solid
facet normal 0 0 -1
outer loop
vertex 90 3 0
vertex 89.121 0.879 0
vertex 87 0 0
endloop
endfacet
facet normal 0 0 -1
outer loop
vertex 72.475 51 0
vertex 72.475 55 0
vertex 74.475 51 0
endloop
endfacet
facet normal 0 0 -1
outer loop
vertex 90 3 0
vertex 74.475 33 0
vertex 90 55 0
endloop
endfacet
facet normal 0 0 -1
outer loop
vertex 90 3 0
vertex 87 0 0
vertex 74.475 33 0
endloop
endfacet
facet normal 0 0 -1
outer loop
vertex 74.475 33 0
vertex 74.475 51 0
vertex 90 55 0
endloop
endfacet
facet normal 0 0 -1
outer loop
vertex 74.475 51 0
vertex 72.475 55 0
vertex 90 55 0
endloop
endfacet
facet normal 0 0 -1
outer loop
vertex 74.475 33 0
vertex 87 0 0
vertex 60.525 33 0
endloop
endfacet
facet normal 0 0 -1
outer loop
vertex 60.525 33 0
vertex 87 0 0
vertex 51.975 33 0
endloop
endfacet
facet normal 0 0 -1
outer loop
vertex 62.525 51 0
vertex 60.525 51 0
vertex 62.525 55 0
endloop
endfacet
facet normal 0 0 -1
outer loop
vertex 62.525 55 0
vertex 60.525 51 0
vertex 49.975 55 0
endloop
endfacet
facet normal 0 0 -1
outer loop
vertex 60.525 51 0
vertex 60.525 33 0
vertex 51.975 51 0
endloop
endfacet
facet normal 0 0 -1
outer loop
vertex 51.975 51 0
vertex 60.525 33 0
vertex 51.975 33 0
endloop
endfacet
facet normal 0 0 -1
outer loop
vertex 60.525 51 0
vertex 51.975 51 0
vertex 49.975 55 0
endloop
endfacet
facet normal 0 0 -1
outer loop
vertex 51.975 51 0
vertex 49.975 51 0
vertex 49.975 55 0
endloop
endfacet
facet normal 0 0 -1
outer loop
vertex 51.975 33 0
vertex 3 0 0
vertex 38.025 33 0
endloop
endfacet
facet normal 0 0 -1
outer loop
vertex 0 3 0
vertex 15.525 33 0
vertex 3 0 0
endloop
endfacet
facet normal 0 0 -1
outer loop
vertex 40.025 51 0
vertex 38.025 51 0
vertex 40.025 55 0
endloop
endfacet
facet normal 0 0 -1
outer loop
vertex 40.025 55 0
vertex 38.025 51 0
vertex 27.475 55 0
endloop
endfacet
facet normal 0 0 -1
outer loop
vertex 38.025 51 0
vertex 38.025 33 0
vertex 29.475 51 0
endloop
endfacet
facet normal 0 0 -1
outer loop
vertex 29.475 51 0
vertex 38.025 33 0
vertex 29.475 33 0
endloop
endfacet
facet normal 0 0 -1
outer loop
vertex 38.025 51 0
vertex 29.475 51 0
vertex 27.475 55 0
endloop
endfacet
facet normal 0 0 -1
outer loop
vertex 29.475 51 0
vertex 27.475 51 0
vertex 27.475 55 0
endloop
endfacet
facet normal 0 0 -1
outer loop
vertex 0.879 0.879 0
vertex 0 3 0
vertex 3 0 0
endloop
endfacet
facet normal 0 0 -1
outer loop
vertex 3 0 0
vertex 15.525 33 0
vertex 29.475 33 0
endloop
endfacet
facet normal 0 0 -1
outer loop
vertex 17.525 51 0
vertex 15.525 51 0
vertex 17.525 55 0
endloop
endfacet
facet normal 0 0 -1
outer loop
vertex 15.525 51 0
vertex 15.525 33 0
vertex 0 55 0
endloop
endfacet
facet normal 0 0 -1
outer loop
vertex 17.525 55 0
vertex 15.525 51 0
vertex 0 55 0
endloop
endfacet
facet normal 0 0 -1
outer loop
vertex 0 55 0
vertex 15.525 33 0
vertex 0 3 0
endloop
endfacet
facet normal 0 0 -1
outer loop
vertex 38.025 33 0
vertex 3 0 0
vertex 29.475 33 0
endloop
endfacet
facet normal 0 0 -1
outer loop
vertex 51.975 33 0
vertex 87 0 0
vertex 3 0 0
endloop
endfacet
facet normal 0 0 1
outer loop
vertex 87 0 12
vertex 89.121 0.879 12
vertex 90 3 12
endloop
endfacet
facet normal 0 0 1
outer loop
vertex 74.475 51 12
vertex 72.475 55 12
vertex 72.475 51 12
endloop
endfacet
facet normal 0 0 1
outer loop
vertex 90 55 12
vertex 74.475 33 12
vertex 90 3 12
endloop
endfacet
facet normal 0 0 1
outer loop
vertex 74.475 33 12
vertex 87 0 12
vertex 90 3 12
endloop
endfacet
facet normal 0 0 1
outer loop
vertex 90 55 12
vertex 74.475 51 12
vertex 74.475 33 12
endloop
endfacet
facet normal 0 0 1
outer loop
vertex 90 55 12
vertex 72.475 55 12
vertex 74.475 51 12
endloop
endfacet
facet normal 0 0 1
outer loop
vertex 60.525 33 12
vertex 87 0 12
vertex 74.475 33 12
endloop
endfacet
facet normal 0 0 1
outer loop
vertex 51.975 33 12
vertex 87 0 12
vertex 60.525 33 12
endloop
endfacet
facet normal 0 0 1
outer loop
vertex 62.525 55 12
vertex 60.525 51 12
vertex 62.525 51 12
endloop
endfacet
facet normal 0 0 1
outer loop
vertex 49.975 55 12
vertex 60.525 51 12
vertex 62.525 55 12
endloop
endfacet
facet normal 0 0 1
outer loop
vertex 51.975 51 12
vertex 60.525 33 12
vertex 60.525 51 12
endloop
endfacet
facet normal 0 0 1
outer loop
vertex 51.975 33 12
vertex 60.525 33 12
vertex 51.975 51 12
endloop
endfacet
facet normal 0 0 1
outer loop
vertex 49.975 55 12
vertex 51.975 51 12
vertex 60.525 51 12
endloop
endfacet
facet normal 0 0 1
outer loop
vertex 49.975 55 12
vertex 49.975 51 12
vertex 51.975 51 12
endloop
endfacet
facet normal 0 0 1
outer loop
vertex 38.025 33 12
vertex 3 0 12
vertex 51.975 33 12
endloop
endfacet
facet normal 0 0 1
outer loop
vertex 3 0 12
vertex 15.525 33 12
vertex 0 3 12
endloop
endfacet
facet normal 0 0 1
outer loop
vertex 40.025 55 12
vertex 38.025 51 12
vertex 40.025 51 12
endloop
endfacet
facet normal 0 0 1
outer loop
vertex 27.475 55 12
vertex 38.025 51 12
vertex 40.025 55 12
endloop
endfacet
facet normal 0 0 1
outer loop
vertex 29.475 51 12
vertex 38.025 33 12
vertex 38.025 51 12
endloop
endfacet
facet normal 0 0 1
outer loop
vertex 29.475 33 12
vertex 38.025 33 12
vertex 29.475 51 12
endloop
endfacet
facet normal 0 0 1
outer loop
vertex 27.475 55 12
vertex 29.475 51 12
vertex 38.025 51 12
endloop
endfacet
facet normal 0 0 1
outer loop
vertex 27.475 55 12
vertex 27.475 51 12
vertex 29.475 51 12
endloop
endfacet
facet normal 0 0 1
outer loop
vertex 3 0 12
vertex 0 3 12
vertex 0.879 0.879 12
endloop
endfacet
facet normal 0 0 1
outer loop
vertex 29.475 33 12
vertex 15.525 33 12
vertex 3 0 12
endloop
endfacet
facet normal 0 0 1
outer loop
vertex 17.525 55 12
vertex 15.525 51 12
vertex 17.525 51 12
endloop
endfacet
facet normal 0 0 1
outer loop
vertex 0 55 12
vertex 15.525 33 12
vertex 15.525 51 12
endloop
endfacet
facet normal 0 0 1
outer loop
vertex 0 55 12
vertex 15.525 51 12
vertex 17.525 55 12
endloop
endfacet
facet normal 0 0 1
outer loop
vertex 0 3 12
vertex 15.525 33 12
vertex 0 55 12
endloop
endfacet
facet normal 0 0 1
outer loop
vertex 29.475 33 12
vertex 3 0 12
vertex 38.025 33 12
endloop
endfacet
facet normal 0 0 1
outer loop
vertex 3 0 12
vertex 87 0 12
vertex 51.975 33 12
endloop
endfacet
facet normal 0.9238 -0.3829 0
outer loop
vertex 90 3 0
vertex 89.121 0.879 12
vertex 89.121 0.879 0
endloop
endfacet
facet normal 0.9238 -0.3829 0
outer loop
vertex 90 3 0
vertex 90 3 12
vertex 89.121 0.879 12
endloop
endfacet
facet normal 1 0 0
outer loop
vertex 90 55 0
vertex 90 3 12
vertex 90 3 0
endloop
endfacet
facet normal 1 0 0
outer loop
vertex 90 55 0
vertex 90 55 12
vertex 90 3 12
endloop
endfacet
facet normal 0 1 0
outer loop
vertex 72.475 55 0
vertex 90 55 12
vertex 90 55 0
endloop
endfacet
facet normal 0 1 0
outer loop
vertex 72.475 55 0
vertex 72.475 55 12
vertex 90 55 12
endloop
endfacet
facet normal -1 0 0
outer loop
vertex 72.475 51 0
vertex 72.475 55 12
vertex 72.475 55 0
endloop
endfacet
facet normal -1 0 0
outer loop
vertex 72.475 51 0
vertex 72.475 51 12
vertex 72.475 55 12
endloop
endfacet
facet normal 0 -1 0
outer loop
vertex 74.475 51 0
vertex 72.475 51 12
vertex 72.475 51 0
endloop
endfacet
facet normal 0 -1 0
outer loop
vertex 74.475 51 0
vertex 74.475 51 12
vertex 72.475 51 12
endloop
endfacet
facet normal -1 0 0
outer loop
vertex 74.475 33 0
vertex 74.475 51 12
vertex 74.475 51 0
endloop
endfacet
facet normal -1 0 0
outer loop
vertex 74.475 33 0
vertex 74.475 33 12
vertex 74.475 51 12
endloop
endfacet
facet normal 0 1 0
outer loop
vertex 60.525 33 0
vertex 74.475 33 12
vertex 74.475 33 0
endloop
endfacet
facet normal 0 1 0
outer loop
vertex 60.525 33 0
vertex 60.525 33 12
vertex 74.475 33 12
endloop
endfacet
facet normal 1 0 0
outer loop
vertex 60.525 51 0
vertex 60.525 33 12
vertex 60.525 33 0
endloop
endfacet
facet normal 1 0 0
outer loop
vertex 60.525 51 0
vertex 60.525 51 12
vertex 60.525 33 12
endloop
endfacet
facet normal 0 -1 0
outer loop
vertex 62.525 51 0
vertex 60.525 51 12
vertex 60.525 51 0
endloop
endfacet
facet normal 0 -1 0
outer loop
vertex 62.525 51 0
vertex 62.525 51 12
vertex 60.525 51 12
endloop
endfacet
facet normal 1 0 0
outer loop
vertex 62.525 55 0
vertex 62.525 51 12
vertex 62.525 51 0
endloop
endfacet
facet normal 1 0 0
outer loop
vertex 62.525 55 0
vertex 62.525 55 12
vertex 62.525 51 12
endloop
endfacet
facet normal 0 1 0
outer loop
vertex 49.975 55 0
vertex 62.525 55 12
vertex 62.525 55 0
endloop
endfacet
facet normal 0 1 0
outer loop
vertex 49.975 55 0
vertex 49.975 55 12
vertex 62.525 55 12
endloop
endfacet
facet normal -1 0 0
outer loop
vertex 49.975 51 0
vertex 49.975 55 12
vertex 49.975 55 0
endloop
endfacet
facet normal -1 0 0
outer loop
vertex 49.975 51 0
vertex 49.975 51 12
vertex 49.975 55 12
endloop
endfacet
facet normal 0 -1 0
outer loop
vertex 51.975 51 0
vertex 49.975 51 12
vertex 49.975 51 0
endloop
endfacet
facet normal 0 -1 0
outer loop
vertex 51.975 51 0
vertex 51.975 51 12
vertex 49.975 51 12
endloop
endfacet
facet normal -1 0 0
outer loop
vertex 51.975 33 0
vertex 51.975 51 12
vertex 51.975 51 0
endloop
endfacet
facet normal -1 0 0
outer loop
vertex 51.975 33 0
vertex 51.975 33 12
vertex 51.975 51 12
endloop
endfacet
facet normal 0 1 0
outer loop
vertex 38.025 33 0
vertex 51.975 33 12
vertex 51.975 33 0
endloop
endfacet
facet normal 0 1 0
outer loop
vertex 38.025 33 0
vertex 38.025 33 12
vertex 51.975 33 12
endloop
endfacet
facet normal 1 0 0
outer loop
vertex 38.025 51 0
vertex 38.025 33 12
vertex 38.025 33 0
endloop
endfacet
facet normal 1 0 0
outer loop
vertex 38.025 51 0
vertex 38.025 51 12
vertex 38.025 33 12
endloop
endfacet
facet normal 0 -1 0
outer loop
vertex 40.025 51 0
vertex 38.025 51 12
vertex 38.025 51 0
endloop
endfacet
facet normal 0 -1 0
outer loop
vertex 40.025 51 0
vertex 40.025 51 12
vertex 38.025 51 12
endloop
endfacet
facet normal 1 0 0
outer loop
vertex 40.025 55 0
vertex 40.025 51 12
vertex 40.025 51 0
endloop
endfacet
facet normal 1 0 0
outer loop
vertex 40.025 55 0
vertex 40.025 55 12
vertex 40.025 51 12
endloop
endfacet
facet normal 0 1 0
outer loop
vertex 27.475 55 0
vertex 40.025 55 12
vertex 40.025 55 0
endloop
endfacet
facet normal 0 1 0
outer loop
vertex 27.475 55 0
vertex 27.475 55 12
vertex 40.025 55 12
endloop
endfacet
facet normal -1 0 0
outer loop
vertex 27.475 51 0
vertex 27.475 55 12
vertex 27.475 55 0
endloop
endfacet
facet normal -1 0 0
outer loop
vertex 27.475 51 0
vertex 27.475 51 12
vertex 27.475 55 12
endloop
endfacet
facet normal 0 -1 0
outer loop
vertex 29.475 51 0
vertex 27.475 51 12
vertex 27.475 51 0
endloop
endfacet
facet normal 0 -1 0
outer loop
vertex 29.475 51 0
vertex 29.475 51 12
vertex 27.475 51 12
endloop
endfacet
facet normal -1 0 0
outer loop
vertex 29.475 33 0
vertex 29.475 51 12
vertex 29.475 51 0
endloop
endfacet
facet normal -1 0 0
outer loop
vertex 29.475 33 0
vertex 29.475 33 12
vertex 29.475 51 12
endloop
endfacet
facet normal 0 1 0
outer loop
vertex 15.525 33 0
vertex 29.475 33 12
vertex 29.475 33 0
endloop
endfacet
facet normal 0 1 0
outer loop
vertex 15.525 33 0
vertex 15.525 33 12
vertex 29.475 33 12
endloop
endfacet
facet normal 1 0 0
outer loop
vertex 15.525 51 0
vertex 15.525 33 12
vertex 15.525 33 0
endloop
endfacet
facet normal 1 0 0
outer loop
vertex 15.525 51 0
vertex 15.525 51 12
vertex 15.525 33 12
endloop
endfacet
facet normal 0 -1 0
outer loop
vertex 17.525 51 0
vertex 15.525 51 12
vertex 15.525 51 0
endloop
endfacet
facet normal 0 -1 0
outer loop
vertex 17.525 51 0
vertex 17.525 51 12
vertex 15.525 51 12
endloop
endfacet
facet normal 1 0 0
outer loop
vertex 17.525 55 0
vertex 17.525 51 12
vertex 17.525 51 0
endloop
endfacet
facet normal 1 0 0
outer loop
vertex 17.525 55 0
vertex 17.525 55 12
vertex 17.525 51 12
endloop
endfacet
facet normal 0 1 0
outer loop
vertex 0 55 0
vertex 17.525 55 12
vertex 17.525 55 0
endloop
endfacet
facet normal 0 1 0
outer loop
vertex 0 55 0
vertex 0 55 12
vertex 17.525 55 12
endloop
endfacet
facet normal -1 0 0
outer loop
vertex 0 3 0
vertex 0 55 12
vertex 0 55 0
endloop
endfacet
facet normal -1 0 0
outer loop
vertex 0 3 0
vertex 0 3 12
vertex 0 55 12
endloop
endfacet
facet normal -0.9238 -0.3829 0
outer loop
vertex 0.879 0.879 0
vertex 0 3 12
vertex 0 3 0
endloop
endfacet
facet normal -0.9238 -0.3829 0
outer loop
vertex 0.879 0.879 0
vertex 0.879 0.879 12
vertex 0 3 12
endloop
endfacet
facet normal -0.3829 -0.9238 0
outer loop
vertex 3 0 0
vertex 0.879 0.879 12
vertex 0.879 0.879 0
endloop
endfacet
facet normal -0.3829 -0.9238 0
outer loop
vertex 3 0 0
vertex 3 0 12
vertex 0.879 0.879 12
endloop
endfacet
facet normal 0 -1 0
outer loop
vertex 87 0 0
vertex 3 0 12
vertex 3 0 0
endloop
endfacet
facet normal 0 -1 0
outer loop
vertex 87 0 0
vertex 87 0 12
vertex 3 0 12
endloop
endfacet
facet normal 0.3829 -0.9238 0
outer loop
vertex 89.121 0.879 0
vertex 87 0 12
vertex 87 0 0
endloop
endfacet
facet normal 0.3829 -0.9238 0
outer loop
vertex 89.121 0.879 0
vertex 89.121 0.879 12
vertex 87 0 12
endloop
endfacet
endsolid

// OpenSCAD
$fn = 32;

// ----------------------------------------------------------------------
// Window plate: 90 x 55 mm, 3 open windows
// ----------------------------------------------------------------------

// --- parameters (mm) ---
profile_height = 12;      // extrusion height
profile_points = 32;      // points of the closed outline

profile = [[0, 3], [0.879, 0.879], [3, 0], [87, 0], [89.121, 0.879], [90, 3], [90, 55], [72.475, 55], [72.475, 51], [74.475, 51], [74.475, 33], [60.525, 33], [60.525, 51], [62.525, 51], [62.525, 55], [49.975, 55], [49.975, 51], [51.975, 51], [51.975, 33], [38.025, 33], [38.025, 51], [40.025, 51], [40.025, 55], [27.475, 55], [27.475, 51], [29.475, 51], [29.475, 33], [15.525, 33], [15.525, 51], [17.525, 51], [17.525, 55], [0, 55]];  // single closed polygon, 32 points, counter clockwise

// --- the one profile operation ---
linear_extrude(height = profile_height) polygon(points = profile);
